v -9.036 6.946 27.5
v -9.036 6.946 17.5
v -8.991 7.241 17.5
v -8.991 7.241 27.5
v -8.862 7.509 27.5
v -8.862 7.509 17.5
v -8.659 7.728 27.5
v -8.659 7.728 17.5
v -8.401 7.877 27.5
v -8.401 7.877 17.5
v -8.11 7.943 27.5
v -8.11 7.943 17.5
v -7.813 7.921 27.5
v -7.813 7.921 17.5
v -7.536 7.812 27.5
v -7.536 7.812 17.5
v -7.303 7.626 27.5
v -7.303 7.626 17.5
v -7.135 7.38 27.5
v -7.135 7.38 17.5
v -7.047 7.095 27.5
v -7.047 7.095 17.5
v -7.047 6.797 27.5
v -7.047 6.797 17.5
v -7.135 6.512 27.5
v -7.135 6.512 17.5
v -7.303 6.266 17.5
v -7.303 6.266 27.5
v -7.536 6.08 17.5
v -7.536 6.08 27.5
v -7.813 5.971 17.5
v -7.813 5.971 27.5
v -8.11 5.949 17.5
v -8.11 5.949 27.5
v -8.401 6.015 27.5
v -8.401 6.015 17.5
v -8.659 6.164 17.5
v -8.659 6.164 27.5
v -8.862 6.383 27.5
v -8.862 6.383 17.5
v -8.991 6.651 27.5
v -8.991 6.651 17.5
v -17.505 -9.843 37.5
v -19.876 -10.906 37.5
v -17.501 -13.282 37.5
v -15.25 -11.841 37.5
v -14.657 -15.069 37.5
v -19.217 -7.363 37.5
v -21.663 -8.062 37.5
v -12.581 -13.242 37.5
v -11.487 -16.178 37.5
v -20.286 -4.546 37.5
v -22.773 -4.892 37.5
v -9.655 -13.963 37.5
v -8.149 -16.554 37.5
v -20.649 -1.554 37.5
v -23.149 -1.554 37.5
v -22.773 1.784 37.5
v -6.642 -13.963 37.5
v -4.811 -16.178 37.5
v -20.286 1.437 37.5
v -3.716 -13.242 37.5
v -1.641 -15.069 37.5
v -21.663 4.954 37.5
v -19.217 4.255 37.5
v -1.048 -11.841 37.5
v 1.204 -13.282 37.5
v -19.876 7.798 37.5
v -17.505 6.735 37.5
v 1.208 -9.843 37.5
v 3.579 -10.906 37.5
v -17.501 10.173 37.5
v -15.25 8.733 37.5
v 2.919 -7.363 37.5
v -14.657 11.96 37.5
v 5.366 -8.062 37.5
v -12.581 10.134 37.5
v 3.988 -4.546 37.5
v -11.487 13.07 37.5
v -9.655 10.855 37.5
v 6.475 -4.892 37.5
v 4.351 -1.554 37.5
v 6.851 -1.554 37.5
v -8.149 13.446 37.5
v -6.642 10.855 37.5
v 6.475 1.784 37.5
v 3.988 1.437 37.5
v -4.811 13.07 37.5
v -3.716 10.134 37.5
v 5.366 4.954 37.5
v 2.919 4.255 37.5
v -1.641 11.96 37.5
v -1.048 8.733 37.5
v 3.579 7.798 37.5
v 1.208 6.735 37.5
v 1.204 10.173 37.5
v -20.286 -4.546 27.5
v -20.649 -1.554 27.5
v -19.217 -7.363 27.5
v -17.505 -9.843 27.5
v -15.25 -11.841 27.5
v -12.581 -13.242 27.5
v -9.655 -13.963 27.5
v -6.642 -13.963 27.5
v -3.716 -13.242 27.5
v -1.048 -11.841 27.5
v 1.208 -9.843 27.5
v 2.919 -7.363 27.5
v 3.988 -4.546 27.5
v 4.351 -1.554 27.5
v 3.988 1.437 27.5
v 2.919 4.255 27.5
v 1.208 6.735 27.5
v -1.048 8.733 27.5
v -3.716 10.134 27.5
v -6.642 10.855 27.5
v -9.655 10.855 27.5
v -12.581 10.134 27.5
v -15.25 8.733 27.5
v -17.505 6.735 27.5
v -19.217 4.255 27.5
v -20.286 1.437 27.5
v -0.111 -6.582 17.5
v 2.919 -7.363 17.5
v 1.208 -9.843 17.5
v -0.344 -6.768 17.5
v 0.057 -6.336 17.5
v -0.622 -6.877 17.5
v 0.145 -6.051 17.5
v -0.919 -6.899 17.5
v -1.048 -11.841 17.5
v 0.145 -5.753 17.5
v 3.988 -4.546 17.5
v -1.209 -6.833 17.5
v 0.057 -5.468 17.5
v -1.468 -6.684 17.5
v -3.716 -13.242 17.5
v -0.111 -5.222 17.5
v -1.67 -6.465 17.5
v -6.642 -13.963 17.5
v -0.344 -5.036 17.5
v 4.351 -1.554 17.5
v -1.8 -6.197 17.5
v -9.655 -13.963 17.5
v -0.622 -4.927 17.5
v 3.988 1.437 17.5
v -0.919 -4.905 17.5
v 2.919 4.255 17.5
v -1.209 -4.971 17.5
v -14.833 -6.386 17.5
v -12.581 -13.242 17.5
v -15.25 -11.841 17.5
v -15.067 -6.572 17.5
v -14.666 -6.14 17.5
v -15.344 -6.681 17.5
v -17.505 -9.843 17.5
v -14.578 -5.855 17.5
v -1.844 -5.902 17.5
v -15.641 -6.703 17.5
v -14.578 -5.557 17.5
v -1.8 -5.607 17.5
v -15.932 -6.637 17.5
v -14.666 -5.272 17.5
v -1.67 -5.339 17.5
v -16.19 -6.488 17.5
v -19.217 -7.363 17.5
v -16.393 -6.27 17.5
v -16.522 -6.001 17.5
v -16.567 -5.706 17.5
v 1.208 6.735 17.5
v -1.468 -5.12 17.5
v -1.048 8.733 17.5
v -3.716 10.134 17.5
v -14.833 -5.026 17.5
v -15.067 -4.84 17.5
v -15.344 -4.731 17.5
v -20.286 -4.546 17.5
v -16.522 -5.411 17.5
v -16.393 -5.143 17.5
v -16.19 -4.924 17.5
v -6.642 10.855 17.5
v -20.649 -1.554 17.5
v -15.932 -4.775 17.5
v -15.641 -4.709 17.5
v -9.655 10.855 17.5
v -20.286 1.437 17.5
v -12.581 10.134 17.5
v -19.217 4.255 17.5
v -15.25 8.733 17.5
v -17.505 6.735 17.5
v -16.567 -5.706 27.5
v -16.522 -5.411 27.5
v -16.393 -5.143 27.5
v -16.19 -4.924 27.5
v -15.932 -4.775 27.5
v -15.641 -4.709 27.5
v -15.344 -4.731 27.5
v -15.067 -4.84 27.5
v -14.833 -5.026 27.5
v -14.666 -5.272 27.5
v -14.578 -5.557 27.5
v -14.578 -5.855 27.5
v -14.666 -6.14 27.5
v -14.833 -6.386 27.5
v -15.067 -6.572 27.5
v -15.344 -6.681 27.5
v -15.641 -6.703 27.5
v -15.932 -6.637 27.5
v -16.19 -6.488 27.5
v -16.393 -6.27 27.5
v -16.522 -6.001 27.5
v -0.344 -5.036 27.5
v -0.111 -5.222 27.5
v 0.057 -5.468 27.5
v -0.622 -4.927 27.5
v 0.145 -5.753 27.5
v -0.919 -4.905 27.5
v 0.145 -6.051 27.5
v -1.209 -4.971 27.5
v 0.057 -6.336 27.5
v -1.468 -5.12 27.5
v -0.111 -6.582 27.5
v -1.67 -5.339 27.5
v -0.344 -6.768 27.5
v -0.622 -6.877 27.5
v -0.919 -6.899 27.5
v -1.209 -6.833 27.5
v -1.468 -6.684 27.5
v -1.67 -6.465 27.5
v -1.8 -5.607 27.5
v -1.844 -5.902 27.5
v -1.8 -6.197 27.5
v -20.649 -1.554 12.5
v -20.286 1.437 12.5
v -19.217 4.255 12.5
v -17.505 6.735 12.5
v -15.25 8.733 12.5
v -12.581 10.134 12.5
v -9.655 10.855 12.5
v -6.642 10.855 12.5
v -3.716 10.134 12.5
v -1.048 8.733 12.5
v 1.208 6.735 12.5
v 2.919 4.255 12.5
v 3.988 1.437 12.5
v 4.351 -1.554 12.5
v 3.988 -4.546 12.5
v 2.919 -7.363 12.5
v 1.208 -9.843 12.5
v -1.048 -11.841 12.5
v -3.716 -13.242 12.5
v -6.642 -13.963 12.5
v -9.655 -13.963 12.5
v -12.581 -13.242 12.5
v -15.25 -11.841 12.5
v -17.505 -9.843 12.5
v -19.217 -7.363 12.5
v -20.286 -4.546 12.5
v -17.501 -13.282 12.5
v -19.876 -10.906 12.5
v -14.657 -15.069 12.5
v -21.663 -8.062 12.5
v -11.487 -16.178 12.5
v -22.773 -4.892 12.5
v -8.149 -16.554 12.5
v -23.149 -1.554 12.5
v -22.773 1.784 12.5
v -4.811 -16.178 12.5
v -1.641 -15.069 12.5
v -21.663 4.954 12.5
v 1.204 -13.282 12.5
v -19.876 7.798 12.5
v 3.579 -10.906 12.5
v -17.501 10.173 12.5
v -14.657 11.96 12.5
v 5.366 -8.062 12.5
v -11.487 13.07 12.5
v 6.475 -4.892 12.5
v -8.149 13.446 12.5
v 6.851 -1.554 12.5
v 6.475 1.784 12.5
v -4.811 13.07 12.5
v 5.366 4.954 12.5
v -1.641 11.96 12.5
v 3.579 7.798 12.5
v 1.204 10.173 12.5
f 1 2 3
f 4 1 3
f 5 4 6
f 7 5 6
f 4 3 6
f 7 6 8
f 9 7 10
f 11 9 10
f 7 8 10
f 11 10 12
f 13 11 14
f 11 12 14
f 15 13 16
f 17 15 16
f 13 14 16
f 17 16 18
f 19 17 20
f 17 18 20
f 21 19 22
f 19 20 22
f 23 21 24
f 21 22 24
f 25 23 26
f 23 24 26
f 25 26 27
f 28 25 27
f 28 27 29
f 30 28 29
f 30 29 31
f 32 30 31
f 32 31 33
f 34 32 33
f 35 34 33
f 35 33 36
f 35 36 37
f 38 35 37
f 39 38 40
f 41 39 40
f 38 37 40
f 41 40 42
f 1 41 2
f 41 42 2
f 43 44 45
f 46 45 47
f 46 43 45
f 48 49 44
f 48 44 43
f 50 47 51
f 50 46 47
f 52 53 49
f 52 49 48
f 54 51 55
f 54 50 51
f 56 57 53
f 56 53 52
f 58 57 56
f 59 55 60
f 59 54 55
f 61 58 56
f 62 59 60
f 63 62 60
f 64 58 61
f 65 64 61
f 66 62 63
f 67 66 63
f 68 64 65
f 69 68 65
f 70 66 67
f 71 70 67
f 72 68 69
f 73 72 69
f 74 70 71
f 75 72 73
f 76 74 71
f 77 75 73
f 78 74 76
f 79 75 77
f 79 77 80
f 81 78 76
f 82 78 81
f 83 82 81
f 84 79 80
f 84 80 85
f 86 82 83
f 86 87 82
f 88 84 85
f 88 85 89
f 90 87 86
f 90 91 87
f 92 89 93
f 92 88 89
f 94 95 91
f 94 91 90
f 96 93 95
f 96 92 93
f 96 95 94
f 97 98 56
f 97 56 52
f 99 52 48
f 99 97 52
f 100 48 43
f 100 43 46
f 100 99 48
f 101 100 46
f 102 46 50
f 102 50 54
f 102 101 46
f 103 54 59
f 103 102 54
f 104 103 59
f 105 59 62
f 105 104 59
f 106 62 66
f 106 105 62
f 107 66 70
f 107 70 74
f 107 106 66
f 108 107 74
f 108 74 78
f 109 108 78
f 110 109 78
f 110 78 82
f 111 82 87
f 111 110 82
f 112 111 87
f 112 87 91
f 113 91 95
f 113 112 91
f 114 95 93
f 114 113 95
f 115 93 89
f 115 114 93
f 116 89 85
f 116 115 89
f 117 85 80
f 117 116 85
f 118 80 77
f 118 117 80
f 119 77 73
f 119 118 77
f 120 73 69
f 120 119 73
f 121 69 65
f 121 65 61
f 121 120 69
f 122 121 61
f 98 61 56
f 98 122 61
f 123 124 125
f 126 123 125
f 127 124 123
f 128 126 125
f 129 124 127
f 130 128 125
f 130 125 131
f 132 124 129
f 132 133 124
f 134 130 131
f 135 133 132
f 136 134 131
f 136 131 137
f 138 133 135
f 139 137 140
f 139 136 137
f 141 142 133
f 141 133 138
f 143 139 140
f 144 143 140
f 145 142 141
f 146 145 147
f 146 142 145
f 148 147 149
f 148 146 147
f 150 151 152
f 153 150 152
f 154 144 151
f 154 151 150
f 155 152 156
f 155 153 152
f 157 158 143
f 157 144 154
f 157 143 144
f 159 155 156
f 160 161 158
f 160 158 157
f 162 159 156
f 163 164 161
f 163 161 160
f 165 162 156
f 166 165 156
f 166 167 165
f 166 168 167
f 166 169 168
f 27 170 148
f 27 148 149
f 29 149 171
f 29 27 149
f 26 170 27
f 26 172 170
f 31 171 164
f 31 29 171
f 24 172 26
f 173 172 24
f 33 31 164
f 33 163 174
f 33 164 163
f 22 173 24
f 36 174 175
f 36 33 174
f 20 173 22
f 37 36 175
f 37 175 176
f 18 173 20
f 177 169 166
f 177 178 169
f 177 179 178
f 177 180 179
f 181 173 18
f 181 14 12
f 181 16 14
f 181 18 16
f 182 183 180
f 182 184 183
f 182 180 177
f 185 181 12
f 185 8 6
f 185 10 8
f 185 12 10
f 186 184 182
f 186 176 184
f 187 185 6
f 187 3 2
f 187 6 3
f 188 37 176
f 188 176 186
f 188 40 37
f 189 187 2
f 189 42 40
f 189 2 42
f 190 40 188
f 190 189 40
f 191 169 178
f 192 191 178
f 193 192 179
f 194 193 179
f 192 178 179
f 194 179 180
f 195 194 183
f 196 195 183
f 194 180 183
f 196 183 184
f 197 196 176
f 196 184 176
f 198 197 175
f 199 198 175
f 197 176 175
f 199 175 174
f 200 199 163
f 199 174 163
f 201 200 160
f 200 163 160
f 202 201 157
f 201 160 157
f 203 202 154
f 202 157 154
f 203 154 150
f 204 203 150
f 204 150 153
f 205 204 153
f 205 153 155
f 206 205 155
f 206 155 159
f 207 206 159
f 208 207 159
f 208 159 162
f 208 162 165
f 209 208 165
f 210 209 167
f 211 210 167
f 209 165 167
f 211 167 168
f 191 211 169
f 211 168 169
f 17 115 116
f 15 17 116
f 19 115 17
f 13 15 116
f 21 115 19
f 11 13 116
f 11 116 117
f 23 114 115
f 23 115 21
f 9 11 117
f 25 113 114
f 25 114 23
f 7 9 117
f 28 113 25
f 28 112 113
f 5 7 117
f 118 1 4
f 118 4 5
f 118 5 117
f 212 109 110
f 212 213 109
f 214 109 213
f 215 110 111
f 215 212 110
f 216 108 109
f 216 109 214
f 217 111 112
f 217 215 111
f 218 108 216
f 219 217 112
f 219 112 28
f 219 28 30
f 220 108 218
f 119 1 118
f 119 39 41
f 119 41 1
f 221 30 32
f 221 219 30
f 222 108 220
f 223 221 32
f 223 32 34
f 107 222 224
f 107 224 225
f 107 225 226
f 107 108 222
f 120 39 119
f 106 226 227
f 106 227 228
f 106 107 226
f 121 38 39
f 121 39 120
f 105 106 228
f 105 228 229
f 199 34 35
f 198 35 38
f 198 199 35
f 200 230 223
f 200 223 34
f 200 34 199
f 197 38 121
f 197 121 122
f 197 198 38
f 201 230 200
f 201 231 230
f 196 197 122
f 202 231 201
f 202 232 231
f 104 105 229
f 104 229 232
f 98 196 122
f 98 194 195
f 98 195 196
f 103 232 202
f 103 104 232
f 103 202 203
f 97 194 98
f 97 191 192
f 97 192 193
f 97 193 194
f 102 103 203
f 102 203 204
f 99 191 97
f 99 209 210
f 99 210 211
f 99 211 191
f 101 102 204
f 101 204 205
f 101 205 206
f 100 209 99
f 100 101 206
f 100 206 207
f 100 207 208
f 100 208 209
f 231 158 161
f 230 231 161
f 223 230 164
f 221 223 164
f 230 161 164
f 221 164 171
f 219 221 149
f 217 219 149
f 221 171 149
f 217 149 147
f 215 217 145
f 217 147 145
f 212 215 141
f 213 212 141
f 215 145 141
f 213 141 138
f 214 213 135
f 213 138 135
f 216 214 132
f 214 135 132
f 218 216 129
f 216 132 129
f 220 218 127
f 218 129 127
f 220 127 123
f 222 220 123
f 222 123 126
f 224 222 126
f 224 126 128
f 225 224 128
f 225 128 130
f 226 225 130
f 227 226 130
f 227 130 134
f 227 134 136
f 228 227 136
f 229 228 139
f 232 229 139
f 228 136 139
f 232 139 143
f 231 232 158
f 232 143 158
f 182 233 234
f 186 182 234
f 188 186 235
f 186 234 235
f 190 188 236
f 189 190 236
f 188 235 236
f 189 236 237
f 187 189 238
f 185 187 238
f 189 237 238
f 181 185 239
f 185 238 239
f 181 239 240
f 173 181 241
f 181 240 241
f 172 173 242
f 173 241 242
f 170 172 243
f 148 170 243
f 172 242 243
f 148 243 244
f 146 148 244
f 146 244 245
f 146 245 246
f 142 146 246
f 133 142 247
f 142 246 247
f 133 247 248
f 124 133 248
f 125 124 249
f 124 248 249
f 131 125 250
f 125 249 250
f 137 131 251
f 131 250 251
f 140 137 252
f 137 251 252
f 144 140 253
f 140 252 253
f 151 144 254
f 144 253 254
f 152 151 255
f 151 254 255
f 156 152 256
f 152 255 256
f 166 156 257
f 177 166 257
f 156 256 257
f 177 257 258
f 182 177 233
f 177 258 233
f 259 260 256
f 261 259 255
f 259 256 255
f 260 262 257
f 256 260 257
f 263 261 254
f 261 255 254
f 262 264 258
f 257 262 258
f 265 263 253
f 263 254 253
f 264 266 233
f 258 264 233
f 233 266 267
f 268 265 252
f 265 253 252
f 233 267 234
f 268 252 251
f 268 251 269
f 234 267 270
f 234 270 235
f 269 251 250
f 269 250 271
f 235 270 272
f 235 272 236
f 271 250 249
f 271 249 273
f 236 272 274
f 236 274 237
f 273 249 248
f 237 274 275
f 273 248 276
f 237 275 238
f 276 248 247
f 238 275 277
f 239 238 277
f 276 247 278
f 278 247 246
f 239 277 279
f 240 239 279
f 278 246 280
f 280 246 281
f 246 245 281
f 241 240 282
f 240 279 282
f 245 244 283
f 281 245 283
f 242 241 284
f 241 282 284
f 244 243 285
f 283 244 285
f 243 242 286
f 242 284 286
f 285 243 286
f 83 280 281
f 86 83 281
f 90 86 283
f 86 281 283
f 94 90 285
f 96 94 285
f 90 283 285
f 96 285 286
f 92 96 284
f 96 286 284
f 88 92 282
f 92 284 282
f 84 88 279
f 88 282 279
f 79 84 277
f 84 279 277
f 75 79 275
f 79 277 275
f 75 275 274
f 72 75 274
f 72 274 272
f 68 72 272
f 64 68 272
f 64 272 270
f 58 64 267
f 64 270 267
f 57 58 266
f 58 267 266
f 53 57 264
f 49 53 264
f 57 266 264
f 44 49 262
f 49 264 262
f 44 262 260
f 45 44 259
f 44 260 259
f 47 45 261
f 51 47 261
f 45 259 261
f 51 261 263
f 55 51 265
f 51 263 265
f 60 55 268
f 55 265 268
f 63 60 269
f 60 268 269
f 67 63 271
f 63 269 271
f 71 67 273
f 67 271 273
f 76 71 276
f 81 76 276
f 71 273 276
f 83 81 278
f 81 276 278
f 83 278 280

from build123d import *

# Parameters (mm, degrees)
IZIM1_R                     = 30
Y_KSEKLIK_EKSTR_ZYON1_DEPTH = 50
SCALE1_SCALE                = 0.5
SKETCH2_R                   = 12.5
CUT_EXTRUDE1_DEPTH          = 5
CUT_EXTRUDE2_START          = -10
SKETCH3_R                   = 12.5
CUT_EXTRUDE2_DEPTH          = 10
SKETCH4_R                   = 1
CUT_EXTRUDE3_DEPTH          = 10


with BuildPart() as part:
    # Çizim1 → Yükseklik-Ekstrüzyon1 (new body)
    with BuildSketch(Plane.XY):
        with Locations((-8.148787303, -1.554097453)):
            Circle(IZIM1_R)
    extrude(amount=Y_KSEKLIK_EKSTR_ZYON1_DEPTH)


with BuildPart() as part_1:
    # Scale1: scaled about (-8.148787303, -1.554097453, 25)
    add(part.part.scale(SCALE1_SCALE).moved(Location((-4.074393652, -0.777048727, 12.5))))

    # Sketch2 → Cut-Extrude1 (cut)
    with BuildSketch(Plane(origin=(0, 0, 12.5), x_dir=(-1, 0, 0), z_dir=(0, 0, -1))):
        with Locations((8.148787303, -1.554097453)):
            Circle(SKETCH2_R)
    extrude(amount=-CUT_EXTRUDE1_DEPTH, mode=Mode.SUBTRACT)

    # Sketch3 → Cut-Extrude2 (cut)
    with BuildSketch(Plane.XY.offset(37.5).offset(CUT_EXTRUDE2_START)):
        with Locations(Location((-8.148787303, -1.554097453, 0), (0, 0, 180))):
            Circle(SKETCH3_R)
    extrude(amount=CUT_EXTRUDE2_DEPTH, mode=Mode.SUBTRACT)

    # Sketch4 → Cut-Extrude3 (cut)
    with BuildSketch(Plane(origin=(0, 0, 17.5), x_dir=(-1, 0, 0), z_dir=(0, 0, -1))):
        with Locations((15.566518124, -5.706210793)):
            Circle(SKETCH4_R)
        with Locations((0.84408626, -5.901984113)):
            Circle(SKETCH4_R)
        with Locations((8.035757524, 6.945902547)):
            Circle(SKETCH4_R)
    extrude(amount=-CUT_EXTRUDE3_DEPTH, mode=Mode.SUBTRACT)


solid = part_1.part
